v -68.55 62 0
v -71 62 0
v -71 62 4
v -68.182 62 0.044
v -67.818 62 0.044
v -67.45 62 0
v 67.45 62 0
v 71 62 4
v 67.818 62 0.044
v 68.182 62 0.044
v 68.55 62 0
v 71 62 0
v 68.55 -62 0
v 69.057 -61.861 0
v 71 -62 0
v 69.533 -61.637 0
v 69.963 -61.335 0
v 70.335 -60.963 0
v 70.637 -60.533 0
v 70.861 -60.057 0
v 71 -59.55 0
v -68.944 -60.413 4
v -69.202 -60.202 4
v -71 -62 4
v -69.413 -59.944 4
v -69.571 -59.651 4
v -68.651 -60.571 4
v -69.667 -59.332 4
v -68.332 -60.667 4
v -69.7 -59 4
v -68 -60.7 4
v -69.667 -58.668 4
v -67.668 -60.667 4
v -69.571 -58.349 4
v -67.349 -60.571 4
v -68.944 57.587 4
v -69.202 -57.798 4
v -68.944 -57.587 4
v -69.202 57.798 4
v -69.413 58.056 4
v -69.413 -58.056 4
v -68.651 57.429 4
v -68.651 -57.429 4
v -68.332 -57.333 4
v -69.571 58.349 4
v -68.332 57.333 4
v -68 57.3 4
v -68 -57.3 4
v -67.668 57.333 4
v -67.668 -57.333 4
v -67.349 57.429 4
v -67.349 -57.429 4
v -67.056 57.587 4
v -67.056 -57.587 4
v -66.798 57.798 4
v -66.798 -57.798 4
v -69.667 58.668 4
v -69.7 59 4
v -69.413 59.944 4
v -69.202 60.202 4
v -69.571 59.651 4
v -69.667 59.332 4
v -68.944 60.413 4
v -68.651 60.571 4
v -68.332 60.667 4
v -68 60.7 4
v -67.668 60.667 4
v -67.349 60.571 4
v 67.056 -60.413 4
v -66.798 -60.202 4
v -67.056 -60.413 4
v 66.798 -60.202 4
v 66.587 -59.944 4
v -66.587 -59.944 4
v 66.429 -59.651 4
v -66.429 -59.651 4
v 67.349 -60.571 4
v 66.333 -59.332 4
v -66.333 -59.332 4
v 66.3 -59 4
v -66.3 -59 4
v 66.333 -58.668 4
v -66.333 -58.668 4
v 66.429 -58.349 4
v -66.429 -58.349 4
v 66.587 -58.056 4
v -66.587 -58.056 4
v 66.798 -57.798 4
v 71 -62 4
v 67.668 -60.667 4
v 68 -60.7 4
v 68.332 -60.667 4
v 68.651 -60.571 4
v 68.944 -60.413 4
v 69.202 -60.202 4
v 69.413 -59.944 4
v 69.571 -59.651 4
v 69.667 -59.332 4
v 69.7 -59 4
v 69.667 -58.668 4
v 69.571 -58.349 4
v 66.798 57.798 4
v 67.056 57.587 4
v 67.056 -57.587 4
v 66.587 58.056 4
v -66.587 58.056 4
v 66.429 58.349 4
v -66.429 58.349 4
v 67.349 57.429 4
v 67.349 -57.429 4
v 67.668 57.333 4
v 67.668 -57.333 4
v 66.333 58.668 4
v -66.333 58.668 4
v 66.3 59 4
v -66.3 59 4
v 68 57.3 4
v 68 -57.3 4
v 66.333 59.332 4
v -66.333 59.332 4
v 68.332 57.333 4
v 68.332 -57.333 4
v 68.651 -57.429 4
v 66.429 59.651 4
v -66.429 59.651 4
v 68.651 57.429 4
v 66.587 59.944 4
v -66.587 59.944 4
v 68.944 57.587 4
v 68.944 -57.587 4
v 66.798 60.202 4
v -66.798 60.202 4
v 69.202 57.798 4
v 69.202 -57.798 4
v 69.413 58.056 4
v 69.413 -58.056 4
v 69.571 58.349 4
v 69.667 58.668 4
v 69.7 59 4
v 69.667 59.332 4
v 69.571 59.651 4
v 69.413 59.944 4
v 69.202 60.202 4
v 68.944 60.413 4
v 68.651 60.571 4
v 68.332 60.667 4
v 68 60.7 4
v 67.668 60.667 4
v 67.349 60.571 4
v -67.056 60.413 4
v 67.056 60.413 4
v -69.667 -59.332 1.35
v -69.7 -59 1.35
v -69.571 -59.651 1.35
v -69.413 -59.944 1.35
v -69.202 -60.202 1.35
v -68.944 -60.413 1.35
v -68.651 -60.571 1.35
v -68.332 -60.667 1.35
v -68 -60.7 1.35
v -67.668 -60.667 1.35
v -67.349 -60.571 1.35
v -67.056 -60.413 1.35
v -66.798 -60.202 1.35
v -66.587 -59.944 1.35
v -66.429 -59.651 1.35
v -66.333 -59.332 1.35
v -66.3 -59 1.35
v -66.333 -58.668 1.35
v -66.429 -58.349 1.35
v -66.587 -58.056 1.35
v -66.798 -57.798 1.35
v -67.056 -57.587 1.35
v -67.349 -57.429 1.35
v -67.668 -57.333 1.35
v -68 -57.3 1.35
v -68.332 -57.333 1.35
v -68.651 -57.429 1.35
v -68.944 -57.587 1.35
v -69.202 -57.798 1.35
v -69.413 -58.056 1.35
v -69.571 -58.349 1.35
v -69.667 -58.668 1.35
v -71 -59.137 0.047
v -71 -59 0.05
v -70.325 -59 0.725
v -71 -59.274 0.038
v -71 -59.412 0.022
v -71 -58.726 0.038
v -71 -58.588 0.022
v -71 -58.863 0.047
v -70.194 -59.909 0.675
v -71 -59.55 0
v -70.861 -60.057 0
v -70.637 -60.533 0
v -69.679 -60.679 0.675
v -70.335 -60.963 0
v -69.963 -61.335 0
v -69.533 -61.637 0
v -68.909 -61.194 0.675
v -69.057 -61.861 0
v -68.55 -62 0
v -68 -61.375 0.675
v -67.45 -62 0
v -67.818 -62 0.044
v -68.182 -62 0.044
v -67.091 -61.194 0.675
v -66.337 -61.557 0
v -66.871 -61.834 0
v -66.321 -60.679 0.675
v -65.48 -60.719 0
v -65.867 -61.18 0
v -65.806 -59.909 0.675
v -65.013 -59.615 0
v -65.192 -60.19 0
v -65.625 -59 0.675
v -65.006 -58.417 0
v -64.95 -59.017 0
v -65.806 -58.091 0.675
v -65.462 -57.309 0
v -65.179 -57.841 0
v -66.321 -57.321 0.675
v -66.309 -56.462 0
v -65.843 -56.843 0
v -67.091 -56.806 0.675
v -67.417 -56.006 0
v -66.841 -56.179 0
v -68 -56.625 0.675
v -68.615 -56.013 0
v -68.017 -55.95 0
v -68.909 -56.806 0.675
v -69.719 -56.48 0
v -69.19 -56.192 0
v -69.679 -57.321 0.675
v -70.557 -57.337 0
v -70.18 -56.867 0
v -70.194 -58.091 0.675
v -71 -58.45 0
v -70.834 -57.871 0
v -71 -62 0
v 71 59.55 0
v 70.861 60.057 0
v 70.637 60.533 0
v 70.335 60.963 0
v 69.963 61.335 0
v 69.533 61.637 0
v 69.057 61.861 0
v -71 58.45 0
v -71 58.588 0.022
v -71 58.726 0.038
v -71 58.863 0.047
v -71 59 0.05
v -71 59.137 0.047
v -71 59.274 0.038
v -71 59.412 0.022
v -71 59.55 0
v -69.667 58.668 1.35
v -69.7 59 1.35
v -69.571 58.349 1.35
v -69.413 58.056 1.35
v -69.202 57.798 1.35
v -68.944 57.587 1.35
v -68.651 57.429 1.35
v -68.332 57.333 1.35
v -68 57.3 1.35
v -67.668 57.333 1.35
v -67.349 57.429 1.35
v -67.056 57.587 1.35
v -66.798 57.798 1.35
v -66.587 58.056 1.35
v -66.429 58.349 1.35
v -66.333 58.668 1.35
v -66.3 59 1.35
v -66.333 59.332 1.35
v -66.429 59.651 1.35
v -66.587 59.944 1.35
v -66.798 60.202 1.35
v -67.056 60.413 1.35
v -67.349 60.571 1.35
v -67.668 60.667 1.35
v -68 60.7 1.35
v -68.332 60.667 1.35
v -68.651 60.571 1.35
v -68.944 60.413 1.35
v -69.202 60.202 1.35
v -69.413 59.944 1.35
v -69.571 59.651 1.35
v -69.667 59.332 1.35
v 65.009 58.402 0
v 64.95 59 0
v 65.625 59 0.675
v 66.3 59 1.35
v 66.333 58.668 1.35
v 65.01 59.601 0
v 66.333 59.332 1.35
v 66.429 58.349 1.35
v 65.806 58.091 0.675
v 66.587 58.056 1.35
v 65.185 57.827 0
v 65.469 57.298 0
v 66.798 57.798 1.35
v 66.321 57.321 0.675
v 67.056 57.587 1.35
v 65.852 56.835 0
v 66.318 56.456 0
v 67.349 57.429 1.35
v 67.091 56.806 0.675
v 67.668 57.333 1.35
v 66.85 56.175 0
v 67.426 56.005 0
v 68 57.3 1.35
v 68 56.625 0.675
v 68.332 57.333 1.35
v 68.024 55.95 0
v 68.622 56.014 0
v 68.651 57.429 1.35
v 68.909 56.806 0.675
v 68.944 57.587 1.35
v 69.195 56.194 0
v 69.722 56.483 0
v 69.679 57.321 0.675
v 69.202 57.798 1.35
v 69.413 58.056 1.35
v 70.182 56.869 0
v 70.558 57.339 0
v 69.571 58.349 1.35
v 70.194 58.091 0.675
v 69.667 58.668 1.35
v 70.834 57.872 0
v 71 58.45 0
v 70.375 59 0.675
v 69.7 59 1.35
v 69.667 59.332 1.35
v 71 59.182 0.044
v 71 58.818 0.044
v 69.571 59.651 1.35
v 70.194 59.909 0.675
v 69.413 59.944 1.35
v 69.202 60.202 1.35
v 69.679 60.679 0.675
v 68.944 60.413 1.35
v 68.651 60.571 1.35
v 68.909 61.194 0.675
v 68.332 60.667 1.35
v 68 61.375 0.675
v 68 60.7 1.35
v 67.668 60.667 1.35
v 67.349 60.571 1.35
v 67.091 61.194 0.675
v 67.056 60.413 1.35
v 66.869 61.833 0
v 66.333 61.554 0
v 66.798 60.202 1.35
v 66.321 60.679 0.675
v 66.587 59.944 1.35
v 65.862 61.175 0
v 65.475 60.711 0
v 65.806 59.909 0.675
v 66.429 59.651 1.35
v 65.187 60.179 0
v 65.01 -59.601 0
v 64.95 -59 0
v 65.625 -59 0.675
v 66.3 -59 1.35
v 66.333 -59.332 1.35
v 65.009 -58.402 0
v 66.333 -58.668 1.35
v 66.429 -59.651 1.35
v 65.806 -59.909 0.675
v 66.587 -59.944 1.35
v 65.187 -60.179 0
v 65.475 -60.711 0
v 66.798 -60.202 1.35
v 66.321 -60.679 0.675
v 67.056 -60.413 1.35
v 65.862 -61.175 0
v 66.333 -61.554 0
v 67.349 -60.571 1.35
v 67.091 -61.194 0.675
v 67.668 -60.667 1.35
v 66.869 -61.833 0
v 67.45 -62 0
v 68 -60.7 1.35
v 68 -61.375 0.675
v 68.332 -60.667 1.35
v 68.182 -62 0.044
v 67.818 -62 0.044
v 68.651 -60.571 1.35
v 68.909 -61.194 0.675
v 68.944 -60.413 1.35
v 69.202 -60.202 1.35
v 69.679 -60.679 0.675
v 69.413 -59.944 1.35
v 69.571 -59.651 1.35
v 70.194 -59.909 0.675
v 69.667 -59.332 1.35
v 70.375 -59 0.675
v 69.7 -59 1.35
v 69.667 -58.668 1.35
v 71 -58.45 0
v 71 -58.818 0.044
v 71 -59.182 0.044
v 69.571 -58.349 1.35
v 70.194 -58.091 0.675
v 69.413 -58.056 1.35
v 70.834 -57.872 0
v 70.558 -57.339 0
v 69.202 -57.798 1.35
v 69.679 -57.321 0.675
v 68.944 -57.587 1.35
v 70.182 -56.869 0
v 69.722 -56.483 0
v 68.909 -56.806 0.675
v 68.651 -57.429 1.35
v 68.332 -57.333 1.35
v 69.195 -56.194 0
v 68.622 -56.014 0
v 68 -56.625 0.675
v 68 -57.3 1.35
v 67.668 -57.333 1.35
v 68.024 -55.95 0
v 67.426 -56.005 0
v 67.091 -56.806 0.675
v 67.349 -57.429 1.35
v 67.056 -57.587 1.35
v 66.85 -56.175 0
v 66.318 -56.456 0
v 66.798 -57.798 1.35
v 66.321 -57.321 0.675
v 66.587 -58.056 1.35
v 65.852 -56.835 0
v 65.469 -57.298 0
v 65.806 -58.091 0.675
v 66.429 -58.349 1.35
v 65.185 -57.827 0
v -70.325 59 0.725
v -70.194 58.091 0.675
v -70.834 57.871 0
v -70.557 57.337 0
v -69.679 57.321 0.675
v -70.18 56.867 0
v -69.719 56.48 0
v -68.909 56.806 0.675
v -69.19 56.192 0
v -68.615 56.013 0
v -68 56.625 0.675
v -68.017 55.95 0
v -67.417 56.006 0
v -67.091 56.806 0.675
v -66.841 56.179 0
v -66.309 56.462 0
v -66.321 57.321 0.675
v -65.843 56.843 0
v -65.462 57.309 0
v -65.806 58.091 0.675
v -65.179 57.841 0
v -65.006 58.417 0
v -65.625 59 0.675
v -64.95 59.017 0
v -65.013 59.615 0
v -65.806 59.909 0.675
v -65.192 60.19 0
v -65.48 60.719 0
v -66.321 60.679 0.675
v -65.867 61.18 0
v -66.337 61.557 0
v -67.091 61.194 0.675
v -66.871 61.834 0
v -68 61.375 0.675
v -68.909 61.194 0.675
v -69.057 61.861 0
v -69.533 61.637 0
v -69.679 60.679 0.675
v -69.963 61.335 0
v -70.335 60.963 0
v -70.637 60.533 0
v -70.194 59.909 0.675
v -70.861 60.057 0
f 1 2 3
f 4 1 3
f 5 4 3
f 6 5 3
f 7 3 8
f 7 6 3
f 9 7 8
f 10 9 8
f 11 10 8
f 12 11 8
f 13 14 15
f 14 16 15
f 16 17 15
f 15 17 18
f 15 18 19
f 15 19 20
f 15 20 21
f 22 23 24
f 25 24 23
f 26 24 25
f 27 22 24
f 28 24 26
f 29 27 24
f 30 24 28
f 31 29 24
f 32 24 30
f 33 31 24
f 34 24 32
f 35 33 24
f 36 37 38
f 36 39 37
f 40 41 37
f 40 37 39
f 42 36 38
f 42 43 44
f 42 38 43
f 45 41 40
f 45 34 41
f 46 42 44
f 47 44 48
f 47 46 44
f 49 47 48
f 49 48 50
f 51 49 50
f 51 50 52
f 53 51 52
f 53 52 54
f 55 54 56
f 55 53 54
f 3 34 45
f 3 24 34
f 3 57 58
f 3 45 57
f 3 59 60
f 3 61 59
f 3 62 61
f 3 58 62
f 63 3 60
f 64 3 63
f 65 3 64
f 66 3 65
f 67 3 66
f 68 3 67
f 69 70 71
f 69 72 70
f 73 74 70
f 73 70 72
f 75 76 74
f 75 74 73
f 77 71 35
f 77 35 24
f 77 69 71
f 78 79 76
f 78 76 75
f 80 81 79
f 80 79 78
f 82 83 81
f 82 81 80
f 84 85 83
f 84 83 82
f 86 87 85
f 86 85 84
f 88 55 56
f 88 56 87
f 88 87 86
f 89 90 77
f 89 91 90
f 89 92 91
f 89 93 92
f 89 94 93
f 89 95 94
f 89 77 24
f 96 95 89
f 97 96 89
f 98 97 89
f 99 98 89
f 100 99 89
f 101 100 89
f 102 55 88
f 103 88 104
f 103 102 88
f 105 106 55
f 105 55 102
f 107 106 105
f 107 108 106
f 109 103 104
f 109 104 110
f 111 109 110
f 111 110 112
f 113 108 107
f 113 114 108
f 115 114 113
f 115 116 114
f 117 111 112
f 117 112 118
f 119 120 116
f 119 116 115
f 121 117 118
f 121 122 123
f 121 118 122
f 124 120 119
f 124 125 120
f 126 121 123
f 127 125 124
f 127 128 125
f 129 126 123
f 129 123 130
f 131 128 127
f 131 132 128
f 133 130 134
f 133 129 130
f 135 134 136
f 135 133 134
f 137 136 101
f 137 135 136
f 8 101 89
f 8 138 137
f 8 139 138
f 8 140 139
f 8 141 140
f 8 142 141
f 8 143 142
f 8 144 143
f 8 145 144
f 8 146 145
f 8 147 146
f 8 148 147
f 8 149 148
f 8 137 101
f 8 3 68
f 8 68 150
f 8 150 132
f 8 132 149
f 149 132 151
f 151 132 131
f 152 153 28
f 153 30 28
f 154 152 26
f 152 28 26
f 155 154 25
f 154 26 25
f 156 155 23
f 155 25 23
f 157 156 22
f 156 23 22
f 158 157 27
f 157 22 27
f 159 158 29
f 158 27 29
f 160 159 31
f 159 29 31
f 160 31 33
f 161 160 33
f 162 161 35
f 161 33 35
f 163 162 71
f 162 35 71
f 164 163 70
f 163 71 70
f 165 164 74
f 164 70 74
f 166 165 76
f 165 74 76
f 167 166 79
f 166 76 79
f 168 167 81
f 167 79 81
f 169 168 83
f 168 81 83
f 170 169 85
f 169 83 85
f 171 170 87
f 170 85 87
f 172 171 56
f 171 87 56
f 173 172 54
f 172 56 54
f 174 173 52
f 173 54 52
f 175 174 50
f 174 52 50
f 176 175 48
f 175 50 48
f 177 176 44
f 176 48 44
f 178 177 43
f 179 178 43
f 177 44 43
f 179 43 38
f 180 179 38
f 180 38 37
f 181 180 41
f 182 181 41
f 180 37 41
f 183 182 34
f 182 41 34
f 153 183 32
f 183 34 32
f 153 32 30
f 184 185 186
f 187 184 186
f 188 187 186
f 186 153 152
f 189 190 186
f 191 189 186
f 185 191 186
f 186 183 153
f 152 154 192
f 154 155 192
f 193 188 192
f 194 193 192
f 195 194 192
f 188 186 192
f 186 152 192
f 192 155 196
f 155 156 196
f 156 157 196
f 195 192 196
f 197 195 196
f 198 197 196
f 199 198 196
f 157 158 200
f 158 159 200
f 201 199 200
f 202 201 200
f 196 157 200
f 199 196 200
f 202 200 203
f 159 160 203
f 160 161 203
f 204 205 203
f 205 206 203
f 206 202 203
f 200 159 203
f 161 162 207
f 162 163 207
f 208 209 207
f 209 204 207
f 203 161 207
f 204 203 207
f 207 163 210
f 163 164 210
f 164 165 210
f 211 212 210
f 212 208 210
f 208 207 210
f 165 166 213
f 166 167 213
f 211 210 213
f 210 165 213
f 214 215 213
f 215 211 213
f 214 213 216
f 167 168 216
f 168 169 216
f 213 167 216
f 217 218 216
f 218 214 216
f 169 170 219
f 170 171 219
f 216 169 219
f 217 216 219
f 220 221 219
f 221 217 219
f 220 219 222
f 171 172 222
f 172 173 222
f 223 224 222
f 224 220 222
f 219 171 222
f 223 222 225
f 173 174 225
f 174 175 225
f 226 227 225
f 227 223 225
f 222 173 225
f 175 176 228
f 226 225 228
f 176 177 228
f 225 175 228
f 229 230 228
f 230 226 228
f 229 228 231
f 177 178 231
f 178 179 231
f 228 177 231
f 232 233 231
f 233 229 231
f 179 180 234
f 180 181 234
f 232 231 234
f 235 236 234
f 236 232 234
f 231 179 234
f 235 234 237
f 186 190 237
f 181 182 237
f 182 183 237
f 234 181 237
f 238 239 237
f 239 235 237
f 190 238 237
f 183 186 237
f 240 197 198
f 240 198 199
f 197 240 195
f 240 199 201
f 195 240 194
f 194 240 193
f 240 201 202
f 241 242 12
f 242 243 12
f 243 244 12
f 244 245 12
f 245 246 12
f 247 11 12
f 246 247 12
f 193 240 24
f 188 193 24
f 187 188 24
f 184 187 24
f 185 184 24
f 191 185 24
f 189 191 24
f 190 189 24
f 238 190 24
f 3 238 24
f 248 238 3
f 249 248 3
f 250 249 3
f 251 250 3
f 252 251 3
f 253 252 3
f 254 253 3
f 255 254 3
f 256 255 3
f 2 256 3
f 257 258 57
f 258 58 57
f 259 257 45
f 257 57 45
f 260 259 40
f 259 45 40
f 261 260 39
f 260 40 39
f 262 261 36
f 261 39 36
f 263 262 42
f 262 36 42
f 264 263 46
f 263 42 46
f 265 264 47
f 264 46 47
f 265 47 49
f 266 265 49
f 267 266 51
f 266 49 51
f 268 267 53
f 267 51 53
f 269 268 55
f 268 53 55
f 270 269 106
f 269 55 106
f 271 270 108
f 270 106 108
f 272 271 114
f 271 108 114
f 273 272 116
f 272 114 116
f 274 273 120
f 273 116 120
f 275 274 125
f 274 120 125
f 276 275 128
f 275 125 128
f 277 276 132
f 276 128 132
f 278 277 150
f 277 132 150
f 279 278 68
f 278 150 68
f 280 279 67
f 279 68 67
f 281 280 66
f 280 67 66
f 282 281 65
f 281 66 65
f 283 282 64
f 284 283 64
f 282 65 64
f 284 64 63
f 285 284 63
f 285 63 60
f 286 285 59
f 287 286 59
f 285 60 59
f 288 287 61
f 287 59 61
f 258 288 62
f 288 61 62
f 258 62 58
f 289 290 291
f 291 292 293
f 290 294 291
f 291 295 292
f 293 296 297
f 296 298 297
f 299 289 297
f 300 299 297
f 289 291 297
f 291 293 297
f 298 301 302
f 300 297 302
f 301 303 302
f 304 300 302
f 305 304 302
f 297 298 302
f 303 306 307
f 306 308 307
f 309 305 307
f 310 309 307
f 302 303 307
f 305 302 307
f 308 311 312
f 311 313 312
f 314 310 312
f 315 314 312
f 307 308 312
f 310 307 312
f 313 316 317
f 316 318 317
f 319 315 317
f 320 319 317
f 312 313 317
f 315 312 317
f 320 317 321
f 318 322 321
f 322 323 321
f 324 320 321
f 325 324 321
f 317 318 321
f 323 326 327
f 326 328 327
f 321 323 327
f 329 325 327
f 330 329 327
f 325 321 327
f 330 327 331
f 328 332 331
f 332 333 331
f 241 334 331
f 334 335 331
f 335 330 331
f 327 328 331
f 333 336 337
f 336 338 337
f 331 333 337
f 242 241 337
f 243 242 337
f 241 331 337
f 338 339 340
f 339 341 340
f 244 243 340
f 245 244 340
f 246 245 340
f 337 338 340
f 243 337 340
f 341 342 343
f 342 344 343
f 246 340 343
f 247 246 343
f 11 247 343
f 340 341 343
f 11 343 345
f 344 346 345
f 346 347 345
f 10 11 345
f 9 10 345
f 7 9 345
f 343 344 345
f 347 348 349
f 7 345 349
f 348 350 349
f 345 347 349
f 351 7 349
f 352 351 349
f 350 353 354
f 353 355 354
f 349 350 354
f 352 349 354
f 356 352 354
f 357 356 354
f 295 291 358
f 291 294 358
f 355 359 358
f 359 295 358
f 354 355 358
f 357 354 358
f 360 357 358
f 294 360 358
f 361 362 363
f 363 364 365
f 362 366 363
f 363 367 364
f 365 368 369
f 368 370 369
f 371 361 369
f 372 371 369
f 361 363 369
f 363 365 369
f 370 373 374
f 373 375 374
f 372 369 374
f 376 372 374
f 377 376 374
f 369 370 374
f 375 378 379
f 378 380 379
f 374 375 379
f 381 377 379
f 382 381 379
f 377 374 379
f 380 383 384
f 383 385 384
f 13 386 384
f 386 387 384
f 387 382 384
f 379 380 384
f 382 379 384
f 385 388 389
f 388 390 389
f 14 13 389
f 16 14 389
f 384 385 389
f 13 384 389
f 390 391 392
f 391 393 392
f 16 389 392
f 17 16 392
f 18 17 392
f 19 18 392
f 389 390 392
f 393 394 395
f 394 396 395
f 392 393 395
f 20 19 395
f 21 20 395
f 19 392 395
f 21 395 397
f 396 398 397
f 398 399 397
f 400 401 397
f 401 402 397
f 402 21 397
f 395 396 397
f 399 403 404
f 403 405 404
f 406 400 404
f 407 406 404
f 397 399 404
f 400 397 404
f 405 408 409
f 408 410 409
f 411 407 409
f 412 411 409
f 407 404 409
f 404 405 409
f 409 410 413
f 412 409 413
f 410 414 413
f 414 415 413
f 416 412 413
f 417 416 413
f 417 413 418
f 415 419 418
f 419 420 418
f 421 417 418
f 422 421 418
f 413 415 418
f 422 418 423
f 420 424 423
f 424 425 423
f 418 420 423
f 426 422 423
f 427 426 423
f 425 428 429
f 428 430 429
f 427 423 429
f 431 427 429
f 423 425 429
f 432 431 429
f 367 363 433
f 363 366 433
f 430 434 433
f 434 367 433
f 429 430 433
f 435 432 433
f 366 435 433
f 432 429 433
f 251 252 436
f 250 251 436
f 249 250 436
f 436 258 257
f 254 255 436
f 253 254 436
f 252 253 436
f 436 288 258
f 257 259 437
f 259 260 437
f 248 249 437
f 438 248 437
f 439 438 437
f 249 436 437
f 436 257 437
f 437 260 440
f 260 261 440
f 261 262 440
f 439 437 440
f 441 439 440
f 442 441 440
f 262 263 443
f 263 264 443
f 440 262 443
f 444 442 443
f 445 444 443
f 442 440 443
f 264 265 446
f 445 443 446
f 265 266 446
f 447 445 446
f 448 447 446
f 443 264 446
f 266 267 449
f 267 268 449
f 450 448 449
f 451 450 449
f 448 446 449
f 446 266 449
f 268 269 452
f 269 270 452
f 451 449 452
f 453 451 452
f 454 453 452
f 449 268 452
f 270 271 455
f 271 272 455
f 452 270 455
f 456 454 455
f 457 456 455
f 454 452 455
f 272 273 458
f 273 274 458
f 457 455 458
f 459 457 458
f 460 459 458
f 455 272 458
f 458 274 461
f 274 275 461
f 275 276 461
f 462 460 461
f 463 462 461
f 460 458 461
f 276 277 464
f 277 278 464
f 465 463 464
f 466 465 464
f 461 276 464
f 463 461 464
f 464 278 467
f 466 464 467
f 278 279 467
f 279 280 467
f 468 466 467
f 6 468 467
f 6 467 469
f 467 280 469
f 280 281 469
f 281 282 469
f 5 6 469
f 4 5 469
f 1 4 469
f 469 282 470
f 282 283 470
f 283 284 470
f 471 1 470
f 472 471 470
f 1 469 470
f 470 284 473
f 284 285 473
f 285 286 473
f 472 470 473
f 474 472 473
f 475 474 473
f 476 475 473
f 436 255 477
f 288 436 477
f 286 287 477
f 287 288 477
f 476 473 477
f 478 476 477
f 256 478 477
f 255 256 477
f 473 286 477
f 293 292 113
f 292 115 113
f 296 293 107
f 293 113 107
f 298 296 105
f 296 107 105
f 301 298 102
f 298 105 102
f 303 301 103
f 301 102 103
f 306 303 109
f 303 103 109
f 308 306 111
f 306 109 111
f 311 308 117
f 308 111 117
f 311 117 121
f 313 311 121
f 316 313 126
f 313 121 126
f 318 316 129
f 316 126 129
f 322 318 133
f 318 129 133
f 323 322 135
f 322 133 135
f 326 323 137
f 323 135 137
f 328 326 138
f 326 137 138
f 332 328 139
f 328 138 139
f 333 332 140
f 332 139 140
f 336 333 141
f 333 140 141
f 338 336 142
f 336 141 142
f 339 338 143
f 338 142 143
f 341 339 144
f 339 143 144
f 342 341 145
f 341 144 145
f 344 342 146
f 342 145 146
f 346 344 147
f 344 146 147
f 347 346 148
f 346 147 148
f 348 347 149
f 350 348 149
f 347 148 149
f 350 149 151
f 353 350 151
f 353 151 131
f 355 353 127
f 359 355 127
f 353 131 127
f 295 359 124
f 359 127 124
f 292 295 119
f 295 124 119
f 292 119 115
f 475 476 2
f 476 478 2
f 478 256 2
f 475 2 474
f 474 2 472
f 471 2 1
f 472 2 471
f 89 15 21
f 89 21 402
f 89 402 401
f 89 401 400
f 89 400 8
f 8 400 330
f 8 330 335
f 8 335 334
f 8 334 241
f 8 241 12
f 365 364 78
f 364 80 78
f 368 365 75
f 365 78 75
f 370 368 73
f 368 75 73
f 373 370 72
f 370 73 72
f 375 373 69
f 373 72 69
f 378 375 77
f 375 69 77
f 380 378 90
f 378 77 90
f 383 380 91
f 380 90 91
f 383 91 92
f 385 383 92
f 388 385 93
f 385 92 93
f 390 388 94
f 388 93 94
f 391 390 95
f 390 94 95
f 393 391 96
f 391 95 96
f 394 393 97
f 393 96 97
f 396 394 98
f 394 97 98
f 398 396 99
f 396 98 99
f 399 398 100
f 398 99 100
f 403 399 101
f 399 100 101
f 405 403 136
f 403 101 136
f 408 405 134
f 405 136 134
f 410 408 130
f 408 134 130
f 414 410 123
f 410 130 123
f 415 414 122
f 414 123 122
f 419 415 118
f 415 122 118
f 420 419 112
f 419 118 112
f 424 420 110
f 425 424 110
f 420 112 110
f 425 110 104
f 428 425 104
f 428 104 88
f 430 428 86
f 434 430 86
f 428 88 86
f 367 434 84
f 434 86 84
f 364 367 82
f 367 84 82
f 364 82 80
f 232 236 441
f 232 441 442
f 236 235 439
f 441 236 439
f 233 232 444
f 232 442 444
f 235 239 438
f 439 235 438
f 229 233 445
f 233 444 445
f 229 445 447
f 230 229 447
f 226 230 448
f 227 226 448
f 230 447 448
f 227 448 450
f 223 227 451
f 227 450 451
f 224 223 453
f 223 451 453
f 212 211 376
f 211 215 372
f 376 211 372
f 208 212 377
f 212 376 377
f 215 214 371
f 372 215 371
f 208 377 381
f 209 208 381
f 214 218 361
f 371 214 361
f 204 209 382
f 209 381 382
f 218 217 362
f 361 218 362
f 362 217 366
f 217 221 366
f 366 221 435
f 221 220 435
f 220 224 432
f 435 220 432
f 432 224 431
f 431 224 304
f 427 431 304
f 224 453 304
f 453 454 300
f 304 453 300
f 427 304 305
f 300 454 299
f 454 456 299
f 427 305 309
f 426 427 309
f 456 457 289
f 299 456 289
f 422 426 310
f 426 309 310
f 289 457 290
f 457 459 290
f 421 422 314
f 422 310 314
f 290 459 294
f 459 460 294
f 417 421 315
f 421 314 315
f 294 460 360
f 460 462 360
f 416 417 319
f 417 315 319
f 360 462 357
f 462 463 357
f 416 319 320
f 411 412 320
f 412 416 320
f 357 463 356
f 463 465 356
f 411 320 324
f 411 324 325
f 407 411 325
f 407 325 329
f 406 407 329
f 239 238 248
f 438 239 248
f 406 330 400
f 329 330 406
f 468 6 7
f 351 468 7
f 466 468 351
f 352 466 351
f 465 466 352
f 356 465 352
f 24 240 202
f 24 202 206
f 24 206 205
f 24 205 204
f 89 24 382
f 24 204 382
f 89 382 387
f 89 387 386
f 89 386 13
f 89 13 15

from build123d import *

# Parameters (mm, degrees)
SKETCH_W         = 142
SKETCH_H         = 124
PAD_DEPTH        = 4
HOLE_D           = 3.4
HOLE_DEPTH       = 25
HOLE_CSINK_D     = 6.1
HOLE_CSINK_ANGLE = 90


with BuildPart() as part:
    # Sketch → Pad (new body)
    with BuildSketch(Plane.XY):
        Rectangle(SKETCH_W, SKETCH_H)
    extrude(amount=PAD_DEPTH)

    # Hole
    with Locations(Plane(origin=(0, 0, 0), x_dir=(1, 0, 0), z_dir=(0, 0, -1))):
        with Locations((-68, 59), (-68, -59), (68, -59), (68, 59)):
            CounterSinkHole(HOLE_D / 2, HOLE_CSINK_D / 2, depth=HOLE_DEPTH, counter_sink_angle=HOLE_CSINK_ANGLE)


solid = part.part
